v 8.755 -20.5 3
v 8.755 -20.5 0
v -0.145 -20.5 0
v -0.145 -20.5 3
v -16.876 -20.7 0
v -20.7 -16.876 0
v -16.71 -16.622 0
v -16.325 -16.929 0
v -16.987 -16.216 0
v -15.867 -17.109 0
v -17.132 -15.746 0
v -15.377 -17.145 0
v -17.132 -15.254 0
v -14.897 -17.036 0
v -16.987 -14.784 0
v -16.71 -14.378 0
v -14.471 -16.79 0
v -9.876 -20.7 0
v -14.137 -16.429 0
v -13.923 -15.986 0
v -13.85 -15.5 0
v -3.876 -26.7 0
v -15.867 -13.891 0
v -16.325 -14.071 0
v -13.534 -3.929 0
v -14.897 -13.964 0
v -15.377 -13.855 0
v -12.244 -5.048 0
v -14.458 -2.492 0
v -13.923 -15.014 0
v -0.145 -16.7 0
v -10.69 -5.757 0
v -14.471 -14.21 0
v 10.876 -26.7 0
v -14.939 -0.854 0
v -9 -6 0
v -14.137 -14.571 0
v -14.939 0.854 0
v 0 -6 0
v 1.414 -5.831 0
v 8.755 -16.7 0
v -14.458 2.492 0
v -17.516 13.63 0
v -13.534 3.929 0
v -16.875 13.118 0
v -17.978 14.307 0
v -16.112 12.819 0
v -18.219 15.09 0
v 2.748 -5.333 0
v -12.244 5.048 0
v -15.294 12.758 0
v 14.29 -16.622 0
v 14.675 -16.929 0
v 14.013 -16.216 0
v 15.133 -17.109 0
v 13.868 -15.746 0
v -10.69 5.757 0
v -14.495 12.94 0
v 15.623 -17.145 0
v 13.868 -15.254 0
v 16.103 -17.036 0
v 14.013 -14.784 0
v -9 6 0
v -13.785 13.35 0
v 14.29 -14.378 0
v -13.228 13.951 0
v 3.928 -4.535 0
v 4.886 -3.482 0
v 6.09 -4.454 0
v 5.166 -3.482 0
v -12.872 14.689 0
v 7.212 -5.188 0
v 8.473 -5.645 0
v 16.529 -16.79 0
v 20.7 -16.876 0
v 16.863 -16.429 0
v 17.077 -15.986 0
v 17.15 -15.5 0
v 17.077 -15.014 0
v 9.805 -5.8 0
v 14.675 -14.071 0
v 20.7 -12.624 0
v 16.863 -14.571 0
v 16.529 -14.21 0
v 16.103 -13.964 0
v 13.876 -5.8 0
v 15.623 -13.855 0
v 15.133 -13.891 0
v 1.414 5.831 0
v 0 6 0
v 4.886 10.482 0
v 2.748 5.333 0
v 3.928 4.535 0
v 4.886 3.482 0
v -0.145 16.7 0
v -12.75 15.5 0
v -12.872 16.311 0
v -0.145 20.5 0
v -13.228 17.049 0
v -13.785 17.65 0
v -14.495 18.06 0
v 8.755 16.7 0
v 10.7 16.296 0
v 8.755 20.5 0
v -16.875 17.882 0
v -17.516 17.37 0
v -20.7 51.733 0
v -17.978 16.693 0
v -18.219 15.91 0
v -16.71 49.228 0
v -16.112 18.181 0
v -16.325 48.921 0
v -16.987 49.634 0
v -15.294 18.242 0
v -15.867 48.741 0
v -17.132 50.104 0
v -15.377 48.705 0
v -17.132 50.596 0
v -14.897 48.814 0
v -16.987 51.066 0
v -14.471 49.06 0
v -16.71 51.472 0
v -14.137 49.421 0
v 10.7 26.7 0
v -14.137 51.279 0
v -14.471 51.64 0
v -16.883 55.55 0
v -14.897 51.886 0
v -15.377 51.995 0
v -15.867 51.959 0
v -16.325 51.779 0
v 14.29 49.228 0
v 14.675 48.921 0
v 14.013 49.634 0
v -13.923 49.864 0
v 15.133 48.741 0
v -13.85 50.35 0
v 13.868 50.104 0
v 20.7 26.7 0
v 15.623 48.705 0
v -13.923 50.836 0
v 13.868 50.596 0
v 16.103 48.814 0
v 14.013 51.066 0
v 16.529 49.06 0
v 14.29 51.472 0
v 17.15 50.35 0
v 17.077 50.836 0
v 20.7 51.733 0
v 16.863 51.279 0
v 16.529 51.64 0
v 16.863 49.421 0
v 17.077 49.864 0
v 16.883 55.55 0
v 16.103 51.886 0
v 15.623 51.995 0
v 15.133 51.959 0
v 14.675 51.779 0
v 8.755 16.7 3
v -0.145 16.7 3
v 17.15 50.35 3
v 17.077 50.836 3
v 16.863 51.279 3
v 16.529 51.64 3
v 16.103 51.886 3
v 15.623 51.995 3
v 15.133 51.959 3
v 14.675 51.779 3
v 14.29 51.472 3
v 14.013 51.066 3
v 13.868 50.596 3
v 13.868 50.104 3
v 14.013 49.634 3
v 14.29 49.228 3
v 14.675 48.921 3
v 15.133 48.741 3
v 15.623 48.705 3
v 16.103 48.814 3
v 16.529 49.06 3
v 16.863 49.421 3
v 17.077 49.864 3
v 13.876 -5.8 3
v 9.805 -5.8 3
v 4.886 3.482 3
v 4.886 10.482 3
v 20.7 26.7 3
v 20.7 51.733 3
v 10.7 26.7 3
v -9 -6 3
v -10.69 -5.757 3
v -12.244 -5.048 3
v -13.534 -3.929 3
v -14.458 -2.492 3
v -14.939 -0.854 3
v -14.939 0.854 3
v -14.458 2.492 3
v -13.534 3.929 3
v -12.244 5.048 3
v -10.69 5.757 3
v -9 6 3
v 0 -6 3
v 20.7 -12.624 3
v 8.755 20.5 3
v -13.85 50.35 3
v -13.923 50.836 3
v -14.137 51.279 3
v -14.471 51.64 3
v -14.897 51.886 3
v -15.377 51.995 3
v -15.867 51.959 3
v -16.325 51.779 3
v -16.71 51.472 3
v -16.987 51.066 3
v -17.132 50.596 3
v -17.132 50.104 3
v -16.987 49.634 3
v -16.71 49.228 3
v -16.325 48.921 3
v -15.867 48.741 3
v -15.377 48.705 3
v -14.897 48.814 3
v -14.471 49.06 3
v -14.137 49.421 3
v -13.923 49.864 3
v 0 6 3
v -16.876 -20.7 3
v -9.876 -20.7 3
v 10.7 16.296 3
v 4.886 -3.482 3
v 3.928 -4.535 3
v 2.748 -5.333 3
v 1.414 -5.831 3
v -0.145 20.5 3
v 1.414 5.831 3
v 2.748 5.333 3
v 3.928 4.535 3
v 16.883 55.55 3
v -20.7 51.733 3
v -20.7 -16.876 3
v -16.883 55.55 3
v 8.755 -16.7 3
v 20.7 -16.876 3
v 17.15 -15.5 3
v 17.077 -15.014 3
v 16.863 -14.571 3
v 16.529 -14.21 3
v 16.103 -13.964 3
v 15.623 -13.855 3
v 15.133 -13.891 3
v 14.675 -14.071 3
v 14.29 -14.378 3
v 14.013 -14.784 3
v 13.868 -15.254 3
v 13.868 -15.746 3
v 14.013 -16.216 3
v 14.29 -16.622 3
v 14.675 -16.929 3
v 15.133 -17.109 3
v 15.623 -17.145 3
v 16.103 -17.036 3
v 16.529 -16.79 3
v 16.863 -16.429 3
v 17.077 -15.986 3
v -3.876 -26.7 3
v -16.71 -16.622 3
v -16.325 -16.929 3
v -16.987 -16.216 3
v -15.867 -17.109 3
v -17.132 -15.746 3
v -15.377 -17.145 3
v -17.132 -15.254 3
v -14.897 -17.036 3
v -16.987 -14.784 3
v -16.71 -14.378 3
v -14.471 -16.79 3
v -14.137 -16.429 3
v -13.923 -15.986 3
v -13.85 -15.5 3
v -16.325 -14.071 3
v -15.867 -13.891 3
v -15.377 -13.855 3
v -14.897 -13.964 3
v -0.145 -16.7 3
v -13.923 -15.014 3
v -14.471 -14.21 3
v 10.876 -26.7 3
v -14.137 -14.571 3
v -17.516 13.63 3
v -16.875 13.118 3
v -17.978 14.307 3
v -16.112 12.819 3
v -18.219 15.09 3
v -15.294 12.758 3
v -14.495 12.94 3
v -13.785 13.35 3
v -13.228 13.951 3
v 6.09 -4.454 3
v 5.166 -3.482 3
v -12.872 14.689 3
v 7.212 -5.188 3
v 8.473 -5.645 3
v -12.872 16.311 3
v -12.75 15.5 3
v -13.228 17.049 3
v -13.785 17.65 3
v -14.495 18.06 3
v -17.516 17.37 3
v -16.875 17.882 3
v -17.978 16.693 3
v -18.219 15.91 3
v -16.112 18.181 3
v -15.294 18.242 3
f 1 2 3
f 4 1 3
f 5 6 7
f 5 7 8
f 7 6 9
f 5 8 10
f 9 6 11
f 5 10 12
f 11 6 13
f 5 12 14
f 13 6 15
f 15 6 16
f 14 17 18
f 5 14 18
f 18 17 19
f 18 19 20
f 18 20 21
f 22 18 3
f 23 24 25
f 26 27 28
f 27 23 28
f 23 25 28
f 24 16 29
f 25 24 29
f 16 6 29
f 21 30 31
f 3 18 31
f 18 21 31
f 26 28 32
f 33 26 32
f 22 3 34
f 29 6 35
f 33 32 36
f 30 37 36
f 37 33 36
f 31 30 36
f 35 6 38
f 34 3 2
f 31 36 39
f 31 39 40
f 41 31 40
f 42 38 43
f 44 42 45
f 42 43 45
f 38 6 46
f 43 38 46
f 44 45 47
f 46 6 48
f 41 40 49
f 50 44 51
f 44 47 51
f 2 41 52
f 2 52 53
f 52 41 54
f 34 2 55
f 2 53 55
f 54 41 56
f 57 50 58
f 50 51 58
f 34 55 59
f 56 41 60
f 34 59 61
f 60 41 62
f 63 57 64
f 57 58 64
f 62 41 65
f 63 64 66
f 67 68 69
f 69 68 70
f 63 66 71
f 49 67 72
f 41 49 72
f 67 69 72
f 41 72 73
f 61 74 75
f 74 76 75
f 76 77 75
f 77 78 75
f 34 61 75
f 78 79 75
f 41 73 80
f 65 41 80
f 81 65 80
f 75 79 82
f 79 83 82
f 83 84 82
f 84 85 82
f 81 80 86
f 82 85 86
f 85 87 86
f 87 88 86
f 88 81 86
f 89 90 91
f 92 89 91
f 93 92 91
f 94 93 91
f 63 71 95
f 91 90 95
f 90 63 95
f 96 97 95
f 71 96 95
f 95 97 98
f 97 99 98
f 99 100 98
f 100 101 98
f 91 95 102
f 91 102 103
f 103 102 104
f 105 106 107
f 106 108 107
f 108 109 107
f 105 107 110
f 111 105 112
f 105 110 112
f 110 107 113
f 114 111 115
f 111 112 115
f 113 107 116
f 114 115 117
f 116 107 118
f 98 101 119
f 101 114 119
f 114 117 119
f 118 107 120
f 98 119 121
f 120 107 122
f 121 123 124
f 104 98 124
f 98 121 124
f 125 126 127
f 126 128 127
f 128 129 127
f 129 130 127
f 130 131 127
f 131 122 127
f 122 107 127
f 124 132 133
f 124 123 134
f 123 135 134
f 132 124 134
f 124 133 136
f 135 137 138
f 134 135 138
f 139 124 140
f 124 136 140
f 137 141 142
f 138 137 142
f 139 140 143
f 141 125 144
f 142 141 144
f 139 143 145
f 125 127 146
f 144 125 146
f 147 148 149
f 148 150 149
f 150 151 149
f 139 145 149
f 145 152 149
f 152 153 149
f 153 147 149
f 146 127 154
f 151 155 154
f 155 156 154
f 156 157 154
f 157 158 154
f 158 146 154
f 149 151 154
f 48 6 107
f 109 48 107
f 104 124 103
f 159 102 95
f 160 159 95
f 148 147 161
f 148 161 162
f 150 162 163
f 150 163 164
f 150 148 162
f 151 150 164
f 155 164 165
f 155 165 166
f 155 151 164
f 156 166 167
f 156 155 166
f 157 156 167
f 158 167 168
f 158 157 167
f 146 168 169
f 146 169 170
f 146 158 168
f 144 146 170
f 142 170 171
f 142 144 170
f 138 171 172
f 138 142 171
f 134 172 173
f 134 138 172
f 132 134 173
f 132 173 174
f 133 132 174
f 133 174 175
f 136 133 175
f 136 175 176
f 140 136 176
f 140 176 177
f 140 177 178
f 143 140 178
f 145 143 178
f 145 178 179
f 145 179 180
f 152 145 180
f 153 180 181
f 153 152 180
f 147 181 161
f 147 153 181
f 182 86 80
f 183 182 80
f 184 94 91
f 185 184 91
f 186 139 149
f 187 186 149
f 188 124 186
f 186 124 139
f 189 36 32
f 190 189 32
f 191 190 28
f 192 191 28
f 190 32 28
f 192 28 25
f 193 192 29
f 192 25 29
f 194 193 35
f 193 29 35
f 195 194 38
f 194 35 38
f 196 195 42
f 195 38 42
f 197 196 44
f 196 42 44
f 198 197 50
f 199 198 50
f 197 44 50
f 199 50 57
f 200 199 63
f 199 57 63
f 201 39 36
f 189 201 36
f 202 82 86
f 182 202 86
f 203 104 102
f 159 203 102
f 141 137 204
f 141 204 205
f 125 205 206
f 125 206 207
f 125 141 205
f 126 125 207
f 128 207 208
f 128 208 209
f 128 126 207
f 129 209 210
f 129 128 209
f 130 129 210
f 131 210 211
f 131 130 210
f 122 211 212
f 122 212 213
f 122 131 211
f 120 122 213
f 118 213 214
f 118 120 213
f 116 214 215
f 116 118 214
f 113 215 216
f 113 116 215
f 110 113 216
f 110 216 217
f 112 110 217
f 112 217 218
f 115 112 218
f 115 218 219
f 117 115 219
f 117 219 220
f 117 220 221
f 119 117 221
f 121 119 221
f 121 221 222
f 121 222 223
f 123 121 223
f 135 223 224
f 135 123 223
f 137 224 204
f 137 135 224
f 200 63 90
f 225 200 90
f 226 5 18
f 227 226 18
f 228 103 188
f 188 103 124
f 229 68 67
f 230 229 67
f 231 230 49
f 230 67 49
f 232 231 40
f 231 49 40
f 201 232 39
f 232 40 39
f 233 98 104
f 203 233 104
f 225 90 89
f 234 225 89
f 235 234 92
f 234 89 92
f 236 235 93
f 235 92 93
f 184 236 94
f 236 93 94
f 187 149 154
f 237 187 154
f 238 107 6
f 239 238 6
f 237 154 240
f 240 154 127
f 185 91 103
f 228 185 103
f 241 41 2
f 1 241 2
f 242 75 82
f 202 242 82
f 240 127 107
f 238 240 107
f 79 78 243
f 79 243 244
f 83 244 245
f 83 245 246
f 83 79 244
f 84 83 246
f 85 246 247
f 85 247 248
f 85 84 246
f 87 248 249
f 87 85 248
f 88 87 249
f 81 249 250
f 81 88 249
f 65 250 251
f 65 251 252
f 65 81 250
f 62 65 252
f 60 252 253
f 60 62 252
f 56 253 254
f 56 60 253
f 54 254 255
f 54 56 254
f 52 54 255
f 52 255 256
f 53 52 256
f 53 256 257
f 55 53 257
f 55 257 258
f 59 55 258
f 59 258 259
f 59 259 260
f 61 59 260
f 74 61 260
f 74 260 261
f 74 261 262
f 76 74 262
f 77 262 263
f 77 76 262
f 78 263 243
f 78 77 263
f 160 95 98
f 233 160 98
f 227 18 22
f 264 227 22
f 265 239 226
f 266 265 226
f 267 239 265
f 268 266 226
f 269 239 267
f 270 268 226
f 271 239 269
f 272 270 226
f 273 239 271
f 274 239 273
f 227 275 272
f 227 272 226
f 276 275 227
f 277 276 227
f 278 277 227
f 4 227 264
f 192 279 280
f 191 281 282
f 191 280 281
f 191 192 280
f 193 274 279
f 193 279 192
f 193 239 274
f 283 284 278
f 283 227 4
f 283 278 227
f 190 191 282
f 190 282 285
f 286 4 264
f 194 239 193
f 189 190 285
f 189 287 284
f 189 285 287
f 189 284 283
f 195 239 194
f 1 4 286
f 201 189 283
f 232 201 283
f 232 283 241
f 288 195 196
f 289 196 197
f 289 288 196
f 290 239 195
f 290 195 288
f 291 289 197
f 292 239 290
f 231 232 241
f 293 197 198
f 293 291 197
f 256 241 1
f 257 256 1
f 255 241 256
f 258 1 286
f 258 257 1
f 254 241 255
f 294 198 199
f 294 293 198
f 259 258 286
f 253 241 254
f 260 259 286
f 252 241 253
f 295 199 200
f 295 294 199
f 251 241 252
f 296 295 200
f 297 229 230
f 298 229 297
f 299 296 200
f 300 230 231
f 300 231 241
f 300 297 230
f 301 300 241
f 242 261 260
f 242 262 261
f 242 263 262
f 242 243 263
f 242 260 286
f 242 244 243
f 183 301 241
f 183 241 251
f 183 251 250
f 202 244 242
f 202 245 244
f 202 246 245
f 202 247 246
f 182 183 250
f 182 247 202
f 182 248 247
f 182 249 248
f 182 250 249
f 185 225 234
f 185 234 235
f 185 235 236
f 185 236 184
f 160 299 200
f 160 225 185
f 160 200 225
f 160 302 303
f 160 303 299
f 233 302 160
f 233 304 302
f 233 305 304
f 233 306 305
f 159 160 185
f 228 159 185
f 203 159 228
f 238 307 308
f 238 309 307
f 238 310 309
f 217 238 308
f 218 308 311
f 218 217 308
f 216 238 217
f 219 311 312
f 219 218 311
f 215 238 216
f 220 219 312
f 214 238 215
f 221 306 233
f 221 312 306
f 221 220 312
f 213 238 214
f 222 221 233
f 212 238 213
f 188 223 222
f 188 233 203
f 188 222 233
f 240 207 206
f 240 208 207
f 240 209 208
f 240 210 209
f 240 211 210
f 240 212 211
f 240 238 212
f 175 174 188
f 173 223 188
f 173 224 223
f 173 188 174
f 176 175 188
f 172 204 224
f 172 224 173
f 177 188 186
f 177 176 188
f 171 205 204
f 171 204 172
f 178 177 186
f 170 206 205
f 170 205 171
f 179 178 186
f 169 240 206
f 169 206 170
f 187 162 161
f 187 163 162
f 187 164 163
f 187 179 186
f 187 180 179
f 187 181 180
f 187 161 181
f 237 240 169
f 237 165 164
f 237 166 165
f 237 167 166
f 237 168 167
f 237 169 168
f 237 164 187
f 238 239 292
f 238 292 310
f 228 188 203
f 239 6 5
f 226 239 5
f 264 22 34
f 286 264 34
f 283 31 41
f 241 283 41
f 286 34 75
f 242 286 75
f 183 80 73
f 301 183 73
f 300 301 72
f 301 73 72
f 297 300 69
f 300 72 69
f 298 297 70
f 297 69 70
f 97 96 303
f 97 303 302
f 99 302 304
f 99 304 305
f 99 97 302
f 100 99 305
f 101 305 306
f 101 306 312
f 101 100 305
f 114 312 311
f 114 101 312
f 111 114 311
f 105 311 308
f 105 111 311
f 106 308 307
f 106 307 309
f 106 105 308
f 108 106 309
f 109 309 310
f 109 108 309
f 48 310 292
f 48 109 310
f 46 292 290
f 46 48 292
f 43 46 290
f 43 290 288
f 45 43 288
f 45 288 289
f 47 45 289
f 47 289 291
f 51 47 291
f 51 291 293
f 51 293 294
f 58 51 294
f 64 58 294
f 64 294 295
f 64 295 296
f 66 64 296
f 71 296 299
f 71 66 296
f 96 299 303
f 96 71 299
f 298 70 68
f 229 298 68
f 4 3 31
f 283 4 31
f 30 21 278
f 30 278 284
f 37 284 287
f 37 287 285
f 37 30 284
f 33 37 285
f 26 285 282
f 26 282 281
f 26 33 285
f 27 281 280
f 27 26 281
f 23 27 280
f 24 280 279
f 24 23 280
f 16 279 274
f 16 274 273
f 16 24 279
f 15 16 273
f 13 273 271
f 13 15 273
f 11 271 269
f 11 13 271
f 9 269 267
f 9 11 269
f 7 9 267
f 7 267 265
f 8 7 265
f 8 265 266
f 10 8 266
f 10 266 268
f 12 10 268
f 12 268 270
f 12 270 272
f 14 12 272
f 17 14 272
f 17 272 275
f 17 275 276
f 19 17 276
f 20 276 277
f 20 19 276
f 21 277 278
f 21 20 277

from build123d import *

# Parameters (mm, degrees)
SKETCH1_R           = 1.65
SKETCH1_R_2         = 2.75
BOSS_EXTRUDE1_DEPTH = 3


with BuildPart() as part:
    # Sketch1 → Boss-Extrude1 (new body)
    with BuildSketch(Plane.XY):
        with BuildLine():
            Line((10.7, 26.7), (20.7, 26.7))
            Line((20.7, 26.7), (20.7, 51.73272542))
            Line((20.7, 51.73272542), (16.88272542, 55.55))
            Line((16.88272542, 55.55), (6.037050808, 55.55))
            Line((6.037050808, 55.55), (2.572949192, 55.55))
            Line((2.572949192, 55.55), (-16.88272542, 55.55))
            Line((-16.88272542, 55.55), (-20.7, 51.73272542))
            Line((-20.7, 51.73272542), (-20.7, 16.875735931))
            Line((-20.7, 16.875735931), (-20.7, -16.875735931))
            Line((-20.7, -16.875735931), (-16.875735931, -20.7))
            Line((-16.875735931, -20.7), (-9.875735931, -20.7))
            Line((-9.875735931, -20.7), (-3.875735931, -26.7))
            Line((-3.875735931, -26.7), (2.572949192, -26.7))
            Line((2.572949192, -26.7), (6.037050808, -26.7))
            Line((6.037050808, -26.7), (10.875735931, -26.7))
            Line((10.875735931, -26.7), (20.7, -16.875735931))
            Line((20.7, -16.875735931), (20.7, -12.624264069))
            Line((20.7, -12.624264069), (13.875735931, -5.8))
            Line((13.875735931, -5.8), (9.805, -5.8))
            ThreePointArc((9.805, -5.8), (7.212268524, -5.188231249), (5.166486047, -3.481980515))
            Line((5.166486047, -3.481980515), (4.88628813, -3.481980515))
            ThreePointArc((4.88628813, -3.481980515), (2.748464745, -5.333473685), (0, -6))
            Line((0, -6), (-9, -6))
            ThreePointArc((-9, -6), (-15, 0), (-9, 6))
            Line((-9, 6), (0, 6))
            ThreePointArc((0, 6), (2.748464745, 5.333473685), (4.88628813, 3.481980515))
            Line((4.88628813, 3.481980515), (4.88628813, 10.481980515))
            Line((4.88628813, 10.481980515), (10.7, 16.295692385))
            Line((10.7, 16.295692385), (10.7, 26.7))
        make_face()
        with Locations((-15.5, -15.5)):
            Circle(SKETCH1_R, mode=Mode.SUBTRACT)
        Polygon((6.037050808, -20.5), (2.572949192, -20.5), (-0.145, -20.5), (-0.145, -16.7), (8.755, -16.7), (8.755, -20.5), align=None, mode=Mode.SUBTRACT)
        with Locations((15.5, -15.5)):
            Circle(SKETCH1_R, mode=Mode.SUBTRACT)
        with Locations((-15.5, 15.5)):
            Circle(SKETCH1_R_2, mode=Mode.SUBTRACT)
        with Locations((-15.5, 50.35)):
            Circle(SKETCH1_R, mode=Mode.SUBTRACT)
        Polygon((-0.145, 20.5), (2.572949192, 20.5), (6.037050808, 20.5), (8.755, 20.5), (8.755, 16.7), (-0.145, 16.7), align=None, mode=Mode.SUBTRACT)
        with Locations((15.5, 50.35)):
            Circle(SKETCH1_R, mode=Mode.SUBTRACT)
    extrude(amount=BOSS_EXTRUDE1_DEPTH)


solid = part.part
